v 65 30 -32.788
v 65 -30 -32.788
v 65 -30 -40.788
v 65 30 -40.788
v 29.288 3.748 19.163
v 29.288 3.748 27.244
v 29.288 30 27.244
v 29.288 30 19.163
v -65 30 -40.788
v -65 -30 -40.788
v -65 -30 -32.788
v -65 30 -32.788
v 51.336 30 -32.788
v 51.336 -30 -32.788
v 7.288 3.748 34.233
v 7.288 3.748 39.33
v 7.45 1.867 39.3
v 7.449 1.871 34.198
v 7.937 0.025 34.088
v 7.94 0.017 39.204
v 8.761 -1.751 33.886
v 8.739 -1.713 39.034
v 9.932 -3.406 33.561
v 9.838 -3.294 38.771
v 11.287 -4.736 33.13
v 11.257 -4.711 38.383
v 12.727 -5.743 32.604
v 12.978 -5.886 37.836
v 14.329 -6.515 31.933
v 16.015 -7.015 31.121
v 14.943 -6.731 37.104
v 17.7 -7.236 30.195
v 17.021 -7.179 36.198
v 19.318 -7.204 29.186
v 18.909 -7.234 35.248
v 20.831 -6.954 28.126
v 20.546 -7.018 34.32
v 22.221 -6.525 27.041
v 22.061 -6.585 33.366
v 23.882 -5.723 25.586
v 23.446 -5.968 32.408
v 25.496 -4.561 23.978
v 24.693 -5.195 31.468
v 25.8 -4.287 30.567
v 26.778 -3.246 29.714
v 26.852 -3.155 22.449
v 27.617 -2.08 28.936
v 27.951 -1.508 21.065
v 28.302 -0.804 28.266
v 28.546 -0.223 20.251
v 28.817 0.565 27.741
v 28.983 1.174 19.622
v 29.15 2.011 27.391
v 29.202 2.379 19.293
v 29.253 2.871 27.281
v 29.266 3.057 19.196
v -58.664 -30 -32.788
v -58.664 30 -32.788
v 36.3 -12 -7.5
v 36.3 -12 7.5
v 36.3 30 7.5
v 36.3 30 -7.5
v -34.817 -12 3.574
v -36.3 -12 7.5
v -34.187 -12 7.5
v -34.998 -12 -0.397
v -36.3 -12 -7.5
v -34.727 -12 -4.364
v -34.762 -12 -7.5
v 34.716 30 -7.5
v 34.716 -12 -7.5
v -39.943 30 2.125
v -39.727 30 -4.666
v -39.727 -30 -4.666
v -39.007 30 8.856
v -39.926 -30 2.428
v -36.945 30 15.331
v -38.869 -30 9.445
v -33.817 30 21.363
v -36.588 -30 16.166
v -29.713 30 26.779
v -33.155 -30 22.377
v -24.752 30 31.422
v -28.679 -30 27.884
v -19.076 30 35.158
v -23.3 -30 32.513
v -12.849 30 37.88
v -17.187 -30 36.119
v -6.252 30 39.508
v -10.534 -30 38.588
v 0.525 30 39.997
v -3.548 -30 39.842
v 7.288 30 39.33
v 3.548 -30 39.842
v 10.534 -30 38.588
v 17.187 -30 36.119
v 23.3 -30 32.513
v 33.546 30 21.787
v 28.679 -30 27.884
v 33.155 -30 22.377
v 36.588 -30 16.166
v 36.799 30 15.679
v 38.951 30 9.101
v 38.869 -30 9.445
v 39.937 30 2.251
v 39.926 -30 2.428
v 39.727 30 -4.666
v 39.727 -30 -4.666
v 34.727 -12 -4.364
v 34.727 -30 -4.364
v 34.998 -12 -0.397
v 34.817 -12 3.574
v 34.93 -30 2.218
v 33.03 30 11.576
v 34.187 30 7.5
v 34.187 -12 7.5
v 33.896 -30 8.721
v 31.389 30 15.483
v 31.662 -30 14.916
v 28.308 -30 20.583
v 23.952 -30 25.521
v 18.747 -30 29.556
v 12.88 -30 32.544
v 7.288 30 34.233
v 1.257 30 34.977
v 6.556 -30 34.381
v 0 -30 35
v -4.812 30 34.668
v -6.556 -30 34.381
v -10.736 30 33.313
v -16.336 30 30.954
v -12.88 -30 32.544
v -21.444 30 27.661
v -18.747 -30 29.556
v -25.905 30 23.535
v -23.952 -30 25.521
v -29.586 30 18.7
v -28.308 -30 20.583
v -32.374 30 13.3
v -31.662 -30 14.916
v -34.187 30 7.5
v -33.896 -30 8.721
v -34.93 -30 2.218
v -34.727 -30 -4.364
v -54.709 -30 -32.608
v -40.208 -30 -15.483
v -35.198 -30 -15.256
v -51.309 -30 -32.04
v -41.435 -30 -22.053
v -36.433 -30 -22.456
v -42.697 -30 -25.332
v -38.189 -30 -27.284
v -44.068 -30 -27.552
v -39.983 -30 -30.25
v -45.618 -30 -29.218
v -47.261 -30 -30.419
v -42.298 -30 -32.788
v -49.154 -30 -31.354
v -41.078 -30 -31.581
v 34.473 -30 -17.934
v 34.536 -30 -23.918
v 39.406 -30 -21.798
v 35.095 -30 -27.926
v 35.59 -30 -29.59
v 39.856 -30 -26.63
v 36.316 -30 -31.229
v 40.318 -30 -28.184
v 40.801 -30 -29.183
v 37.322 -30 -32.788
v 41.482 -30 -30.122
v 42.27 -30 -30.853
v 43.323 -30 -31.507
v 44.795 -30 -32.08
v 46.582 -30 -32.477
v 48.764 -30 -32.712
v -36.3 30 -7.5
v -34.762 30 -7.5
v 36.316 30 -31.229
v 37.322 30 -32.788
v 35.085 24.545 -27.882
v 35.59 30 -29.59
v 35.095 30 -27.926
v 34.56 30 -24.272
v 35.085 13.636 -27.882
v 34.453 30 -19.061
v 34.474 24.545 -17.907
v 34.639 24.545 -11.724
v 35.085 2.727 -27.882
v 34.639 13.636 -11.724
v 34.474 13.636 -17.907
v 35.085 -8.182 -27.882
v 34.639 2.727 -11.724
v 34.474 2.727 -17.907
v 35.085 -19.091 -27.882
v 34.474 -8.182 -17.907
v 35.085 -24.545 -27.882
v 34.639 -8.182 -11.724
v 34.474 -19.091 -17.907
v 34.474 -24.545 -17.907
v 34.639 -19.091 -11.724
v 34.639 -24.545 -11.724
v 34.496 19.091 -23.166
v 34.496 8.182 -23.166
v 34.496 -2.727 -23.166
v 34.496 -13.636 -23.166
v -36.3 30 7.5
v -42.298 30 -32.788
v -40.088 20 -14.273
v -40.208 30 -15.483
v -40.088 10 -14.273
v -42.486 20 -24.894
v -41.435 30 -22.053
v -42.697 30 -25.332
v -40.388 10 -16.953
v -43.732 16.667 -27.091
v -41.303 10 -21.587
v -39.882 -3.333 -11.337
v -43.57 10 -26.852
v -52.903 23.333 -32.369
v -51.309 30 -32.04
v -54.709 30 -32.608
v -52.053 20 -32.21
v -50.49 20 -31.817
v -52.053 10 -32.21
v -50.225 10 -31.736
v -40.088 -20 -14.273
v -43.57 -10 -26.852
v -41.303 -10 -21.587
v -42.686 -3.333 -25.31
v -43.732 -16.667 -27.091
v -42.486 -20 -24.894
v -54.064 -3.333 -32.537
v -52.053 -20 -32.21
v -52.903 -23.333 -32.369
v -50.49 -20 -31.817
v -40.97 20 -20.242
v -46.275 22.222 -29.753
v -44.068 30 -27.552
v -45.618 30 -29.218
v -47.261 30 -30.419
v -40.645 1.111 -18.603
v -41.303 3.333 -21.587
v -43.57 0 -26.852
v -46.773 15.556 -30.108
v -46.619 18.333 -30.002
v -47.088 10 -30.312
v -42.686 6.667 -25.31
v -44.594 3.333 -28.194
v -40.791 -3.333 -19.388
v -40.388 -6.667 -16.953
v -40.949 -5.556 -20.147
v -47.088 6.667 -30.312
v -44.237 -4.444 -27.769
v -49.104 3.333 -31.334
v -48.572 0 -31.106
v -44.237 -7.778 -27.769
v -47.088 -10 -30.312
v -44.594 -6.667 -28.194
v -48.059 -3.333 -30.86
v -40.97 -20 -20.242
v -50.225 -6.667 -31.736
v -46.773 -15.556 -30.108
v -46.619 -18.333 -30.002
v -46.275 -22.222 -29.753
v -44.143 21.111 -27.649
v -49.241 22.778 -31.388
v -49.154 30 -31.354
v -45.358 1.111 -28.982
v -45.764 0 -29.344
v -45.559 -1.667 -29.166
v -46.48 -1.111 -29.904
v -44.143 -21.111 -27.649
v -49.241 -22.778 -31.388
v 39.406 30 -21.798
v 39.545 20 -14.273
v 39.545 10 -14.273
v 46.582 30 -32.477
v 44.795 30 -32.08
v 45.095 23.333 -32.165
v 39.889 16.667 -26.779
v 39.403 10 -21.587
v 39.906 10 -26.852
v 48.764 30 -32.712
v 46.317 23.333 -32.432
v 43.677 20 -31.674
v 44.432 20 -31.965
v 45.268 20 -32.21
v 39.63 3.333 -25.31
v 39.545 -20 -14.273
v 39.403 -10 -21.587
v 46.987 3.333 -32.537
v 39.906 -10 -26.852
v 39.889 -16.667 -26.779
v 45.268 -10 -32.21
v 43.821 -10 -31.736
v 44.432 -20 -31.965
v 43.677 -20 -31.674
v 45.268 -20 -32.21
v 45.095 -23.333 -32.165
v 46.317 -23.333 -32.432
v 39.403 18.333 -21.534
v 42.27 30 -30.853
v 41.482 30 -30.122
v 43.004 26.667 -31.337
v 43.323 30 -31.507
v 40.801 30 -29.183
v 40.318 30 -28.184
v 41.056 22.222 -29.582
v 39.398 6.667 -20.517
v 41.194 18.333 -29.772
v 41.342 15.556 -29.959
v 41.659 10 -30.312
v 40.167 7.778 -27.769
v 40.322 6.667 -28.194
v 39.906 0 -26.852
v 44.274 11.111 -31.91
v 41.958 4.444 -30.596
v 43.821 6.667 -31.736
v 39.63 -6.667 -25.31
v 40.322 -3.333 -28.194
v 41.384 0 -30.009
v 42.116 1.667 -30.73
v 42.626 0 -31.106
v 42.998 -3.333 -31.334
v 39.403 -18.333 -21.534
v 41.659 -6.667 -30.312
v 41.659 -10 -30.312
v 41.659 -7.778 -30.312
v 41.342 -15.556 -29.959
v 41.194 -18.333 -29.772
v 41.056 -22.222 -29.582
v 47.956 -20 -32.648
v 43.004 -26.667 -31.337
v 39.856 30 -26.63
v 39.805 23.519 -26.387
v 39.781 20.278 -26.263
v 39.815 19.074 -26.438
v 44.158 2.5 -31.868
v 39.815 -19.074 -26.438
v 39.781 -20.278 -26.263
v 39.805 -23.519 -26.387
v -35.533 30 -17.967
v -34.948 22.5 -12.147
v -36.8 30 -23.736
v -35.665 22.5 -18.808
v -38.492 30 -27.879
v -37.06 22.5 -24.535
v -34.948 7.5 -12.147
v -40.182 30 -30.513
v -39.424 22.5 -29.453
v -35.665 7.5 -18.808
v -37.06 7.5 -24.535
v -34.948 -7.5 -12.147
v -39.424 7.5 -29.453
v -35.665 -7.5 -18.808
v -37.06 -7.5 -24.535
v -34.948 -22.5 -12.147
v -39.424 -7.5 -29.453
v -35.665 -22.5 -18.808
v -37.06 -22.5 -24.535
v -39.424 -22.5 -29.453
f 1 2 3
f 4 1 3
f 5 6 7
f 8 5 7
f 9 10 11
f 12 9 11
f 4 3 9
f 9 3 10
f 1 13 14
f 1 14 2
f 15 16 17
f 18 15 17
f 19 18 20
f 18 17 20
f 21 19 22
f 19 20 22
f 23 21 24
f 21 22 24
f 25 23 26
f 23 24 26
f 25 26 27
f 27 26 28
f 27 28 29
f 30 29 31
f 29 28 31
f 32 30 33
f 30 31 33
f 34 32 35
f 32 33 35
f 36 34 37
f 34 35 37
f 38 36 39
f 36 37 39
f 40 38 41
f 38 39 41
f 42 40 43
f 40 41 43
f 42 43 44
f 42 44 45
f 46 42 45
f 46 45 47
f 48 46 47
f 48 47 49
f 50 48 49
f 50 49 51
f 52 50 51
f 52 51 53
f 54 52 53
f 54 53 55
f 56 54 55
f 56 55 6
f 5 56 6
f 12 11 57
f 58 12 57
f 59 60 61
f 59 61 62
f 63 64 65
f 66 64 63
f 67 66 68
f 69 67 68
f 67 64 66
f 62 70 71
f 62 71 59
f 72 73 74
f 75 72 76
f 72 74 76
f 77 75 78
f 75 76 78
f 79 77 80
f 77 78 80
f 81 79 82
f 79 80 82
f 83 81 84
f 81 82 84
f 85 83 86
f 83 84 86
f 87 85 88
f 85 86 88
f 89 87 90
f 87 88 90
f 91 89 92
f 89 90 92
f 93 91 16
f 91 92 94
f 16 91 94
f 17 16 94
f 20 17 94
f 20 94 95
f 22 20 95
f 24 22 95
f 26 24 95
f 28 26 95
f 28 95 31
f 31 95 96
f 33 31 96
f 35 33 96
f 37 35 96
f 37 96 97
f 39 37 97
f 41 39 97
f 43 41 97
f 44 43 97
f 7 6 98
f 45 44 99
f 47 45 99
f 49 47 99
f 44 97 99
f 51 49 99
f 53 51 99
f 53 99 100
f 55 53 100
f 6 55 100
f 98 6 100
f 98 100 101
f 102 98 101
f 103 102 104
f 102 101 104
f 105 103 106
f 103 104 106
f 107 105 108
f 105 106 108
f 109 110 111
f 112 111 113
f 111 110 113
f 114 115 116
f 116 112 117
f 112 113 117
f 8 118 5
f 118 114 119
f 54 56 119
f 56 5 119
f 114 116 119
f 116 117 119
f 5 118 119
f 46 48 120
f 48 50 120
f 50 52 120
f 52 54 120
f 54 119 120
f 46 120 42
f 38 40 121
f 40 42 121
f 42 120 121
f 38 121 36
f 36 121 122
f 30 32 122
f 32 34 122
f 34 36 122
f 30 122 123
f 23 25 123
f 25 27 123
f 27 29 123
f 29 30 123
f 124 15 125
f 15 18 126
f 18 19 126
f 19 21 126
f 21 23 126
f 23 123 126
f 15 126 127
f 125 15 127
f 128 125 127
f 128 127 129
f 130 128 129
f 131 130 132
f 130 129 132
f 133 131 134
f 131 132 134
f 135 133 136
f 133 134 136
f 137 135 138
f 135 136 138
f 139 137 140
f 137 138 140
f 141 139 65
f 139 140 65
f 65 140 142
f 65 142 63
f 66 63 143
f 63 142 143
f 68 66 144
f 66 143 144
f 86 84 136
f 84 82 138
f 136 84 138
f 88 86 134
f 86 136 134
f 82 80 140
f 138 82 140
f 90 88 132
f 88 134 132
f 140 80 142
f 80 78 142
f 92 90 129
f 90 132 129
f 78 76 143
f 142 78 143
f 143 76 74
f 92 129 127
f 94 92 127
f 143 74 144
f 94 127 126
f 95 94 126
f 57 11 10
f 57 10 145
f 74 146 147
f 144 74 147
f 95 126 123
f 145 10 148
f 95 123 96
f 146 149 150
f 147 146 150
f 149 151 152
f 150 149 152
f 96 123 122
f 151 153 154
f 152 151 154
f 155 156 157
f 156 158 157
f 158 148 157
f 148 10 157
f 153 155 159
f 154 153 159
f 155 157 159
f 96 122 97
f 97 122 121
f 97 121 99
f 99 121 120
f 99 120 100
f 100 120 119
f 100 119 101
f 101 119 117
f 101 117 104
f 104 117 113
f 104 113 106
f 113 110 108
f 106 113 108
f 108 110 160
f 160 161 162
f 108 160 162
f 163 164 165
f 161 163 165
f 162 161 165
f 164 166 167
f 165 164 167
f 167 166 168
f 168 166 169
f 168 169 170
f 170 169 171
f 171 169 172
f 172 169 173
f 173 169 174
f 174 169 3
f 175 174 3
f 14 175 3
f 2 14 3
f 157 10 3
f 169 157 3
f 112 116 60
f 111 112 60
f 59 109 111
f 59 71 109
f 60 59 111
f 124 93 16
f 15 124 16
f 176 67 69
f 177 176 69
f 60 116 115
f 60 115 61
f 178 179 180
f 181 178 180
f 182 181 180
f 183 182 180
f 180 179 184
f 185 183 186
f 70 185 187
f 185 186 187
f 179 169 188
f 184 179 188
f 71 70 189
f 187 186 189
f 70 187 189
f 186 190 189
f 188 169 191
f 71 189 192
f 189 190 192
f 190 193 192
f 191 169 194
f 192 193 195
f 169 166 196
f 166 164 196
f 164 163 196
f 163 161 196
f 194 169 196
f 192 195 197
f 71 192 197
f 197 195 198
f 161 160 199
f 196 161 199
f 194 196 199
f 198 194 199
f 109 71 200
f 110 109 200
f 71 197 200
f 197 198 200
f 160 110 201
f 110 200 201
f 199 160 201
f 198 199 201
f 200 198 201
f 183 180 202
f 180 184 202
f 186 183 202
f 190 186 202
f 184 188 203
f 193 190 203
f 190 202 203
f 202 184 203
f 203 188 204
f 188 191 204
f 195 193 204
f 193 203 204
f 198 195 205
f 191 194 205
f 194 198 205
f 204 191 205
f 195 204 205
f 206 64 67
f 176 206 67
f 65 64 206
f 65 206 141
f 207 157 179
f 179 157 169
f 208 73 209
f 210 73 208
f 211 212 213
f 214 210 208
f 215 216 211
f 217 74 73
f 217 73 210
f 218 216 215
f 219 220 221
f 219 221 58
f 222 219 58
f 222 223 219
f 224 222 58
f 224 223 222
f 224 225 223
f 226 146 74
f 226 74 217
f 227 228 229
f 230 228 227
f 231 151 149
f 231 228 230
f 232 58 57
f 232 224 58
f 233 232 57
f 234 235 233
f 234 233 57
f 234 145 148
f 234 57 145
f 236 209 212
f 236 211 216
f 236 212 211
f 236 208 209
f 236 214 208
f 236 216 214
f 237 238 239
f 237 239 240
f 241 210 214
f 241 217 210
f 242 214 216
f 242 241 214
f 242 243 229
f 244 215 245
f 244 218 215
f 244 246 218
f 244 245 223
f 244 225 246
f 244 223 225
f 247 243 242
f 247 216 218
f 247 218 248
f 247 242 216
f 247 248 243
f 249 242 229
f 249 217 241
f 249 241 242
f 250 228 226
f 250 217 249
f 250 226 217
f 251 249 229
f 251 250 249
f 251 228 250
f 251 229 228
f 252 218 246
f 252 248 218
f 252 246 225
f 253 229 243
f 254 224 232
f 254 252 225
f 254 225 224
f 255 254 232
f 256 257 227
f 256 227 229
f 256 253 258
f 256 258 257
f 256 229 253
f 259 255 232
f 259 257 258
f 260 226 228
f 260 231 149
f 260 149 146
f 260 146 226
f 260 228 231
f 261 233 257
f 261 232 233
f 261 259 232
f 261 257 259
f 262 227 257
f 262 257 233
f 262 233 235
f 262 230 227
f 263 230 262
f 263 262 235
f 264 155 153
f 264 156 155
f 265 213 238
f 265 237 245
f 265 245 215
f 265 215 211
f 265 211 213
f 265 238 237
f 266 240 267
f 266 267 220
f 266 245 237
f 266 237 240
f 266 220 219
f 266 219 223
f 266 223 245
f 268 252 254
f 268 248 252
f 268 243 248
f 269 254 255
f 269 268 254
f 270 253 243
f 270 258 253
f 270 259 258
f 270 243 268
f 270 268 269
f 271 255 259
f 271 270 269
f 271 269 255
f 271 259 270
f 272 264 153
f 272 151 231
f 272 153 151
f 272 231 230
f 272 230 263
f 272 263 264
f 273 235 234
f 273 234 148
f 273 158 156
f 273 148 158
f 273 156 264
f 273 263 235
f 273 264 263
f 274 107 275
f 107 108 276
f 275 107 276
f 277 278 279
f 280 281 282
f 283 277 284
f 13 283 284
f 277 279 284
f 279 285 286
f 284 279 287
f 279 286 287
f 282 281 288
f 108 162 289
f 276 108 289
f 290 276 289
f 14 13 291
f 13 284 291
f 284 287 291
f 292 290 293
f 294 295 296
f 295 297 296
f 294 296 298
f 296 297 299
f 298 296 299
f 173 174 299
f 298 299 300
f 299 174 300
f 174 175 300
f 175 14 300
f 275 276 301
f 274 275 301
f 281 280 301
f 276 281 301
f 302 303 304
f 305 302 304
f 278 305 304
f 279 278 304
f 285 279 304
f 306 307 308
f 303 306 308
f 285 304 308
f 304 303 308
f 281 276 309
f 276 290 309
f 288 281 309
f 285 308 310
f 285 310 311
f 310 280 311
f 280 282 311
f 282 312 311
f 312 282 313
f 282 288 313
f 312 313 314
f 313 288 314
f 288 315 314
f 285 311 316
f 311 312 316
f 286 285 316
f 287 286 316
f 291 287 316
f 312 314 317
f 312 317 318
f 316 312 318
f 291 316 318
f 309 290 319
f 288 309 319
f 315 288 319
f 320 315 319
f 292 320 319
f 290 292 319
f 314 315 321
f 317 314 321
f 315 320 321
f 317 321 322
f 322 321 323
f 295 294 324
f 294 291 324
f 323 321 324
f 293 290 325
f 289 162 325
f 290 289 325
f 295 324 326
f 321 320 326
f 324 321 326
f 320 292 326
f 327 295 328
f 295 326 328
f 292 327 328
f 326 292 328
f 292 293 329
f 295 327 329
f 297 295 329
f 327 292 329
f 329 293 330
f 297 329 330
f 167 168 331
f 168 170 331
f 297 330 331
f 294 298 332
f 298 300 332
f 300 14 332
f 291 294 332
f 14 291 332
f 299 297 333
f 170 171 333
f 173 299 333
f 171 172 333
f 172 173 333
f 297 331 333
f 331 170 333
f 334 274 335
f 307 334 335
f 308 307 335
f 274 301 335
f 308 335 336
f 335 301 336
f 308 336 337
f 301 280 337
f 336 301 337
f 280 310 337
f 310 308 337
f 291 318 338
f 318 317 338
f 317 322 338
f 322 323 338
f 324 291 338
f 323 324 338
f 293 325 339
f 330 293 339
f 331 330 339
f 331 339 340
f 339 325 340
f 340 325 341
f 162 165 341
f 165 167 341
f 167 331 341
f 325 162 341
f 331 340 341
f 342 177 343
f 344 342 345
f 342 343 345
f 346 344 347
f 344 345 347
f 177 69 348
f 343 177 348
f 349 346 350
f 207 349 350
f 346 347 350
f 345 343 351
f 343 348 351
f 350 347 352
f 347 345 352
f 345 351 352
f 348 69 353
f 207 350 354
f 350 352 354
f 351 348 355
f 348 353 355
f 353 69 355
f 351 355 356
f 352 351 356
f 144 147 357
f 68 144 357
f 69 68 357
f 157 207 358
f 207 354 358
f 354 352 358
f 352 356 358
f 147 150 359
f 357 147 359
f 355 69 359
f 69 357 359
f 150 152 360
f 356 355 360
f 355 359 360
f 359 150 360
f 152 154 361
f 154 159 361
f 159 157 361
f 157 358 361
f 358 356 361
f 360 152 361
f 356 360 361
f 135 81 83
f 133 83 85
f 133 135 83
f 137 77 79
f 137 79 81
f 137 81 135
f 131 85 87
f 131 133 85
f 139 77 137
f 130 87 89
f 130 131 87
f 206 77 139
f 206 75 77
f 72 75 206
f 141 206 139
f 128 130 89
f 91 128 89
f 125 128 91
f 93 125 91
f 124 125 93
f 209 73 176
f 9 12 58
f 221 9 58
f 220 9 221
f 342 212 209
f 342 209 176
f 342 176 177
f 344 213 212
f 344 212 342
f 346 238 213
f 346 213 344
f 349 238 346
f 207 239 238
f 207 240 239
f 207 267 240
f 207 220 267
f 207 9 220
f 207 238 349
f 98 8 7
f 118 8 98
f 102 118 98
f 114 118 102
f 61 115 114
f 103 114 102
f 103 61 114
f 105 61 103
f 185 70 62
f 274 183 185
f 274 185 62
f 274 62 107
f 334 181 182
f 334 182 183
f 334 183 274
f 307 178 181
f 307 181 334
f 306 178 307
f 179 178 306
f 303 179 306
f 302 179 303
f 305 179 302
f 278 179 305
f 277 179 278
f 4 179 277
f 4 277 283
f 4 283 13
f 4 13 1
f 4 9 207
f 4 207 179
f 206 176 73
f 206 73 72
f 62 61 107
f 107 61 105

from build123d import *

# Parameters (mm, degrees)
BOSS_EXTRUDE2_START     = -30
BOSS_EXTRUDE2_DEPTH     = 60
CUT_EXTRUDE1_DEPTH      = 30
CUT_EXTRUDE1_DEPTH_BACK = 12
SKETCH2_W               = 72.600000086
SKETCH2_H               = 15
CUT_EXTRUDE2_REACH      = 109.943
CUT_EXTRUDE2_END_RADIUS = 35


# Read off the part's stored shape, not the designer's step: Boss-Extrude2
with BuildPart() as part:
    # Boss-Extrude2 outline → Boss-Extrude2 (new body)
    with BuildSketch(Plane(origin=(0, 0, 0), x_dir=(1, 0, 0), z_dir=(0, 1, 0)).offset(BOSS_EXTRUDE2_START)):
        with BuildLine():
            Line((-65, 40.788), (-65, 32.788))
            Line((-65, 32.788), (-58.6640897, 32.788))
            add(Edge.make_bspline(
                [(-39.726875088, 4.666411438), (-39.726875088, 26.333078105), (-43.6640897, 32.788), (-58.6640897, 32.788)],
                knots=[0, 0, 0, 0, 1, 1, 1, 1], degree=3))
            ThreePointArc((-39.726875088, 4.666411438), (0, -40), (39.726875088, 4.666411438))
            add(Edge.make_bspline(
                [(39.726875088, 4.666411438), (39.726875088, 26.333078105), (36.335782116, 32.788), (51.335782116, 32.788)],
                knots=[0, 0, 0, 0, 1, 1, 1, 1], degree=3))
            Line((51.335782116, 32.788), (65, 32.788))
            Line((65, 32.788), (65, 40.788))
            Line((65, 40.788), (-65, 40.788))
        make_face()
        with BuildLine():
            add(Edge.make_bspline(
                [(37.322321234, 32.787999997), (37.214983937, 32.6492714), (36.601118756, 31.814611367), (35.73171702, 30.172599558), (34.800229832, 27.122418367), (34.414470427, 23.259382738), (34.438742851, 18.930468379), (34.548064386, 14.993063003), (34.641903468, 11.772708701), (34.703941427, 8.845933226), (34.725133622, 6.653478096), (34.72929314, 5.367067617), (34.727774909, 4.696007075), (34.726875088, 4.363959967)],
                knots=[0.359345427, 0.359345427, 0.359345427, 0.359345427, 0.372091813, 0.434882632, 0.49767345, 0.623255088, 0.748836725, 0.811627544, 0.874418363, 0.937209181, 0.968604591, 0.984302295, 1, 1, 1, 1], degree=3))
            ThreePointArc((34.726875088, 4.363959967), (0, -35), (-34.726875088, 4.363959967))
            add(Edge.make_bspline(
                [(-34.726875088, 4.363959967), (-34.729305052, 5.049007951), (-34.738428611, 6.435574708), (-34.793206082, 9.076539579), (-34.927377092, 12.195031477), (-35.211190541, 15.649676256), (-35.779016422, 19.912389182), (-36.900687517, 24.659444132), (-39.068630657, 29.318190534), (-41.204796111, 31.813713357), (-42.298121026, 32.787999997)],
                knots=[-0.0046531, -0.0046531, -0.0046531, -0.0046531, 0.02674231, 0.058137719, 0.120928538, 0.183719357, 0.246510175, 0.372091813, 0.49767345, 0.601270914, 0.601270914, 0.601270914, 0.601270914], degree=3))
            Line((-42.298121026, 32.787999997), (37.322321234, 32.787999997))
        make_face(mode=Mode.SUBTRACT)
    extrude(amount=BOSS_EXTRUDE2_DEPTH)

    # Sketch2 → Cut-Extrude1 (cut, two sides: drawn at the far end of the back side and taken through both)
    with BuildSketch(Plane(origin=(0, 0, 0), x_dir=(1, 0, 0), z_dir=(0, 1, 0)).offset(-CUT_EXTRUDE1_DEPTH_BACK)):
        Rectangle(SKETCH2_W, SKETCH2_H)
    extrude(amount=CUT_EXTRUDE1_DEPTH + CUT_EXTRUDE1_DEPTH_BACK, mode=Mode.SUBTRACT)

    # Cut-Extrude2: up to this cylinder (the profile starts outside it)
    cut_extrude2_end = Plane(origin=(0, 12.467931, 0), z_dir=(0, -1, 0)) * Cylinder(CUT_EXTRUDE2_END_RADIUS, 290.886, mode=Mode.PRIVATE)
    # Sketch4 → Cut-Extrude2 (cut, up to the surface)
    with BuildSketch(Plane.XY.offset(40), mode=Mode.PRIVATE) as cut_extrude2_sk1:
        with BuildLine():
            Line((7.288, 30), (7.288, 3.748))
            ThreePointArc((7.288, 3.748), (18.288, -7.252), (29.288, 3.748))
            Line((29.288, 3.748), (29.288, 30))
            Line((29.288, 30), (7.288, 30))
        make_face()
    cut_extrude2_tool1 = extrude(cut_extrude2_sk1.sketch, amount=-CUT_EXTRUDE2_REACH, mode=Mode.PRIVATE) - cut_extrude2_end
    add(cut_extrude2_tool1.solids().sort_by_distance((18.288, 12.467931, 40))[0], mode=Mode.SUBTRACT)


solid = part.part
